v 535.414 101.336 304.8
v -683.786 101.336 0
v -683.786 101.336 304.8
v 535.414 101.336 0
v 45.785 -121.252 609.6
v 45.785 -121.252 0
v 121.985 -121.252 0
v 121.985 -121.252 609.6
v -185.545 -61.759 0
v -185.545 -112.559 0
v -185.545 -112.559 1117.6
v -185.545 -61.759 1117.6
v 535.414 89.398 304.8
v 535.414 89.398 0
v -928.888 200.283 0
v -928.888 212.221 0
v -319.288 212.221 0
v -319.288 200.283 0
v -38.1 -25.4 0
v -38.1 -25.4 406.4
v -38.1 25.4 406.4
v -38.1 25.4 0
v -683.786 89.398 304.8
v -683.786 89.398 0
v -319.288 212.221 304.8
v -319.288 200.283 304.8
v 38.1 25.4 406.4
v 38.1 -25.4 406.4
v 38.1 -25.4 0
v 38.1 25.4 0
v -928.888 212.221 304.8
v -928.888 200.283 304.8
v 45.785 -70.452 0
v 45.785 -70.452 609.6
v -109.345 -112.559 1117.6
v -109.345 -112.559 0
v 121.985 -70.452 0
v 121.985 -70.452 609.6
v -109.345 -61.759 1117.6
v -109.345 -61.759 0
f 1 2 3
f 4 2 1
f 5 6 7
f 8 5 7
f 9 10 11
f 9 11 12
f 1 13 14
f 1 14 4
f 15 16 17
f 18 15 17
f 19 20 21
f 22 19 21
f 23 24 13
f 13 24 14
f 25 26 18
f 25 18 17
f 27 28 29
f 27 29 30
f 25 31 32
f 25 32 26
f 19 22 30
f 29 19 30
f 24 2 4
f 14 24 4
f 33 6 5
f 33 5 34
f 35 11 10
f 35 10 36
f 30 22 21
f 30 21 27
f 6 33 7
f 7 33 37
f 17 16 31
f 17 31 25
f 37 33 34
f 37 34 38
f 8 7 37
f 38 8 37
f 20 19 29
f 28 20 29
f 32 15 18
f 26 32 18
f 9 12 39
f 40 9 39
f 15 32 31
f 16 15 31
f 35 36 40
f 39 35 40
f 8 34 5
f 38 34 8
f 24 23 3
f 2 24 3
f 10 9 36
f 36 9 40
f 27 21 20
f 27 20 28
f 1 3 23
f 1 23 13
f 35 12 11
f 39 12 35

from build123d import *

# Parameters (mm, degrees)
F0_W     = 76.2
F0_H     = 50.8
F1_DEPTH = 406.4
F2_DEPTH = 609.6
F3_DEPTH = 1117.6
F0_W_2   = 1219.2
F0_H_2   = 11.938
F4_DEPTH = 304.8
F0_W_3   = 609.6
F5_DEPTH = 304.8


with BuildPart() as f1:
    # F0 (on Top) → F1 (new body)
    with BuildSketch(Plane.XY):
        Rectangle(F0_W, F0_H)
    extrude(amount=F1_DEPTH)


with BuildPart() as f2:
    # F0 (on Top) → F2 (new body)
    with BuildSketch(Plane.XY):
        with Locations((83.884548, -95.851874)):
            Rectangle(F0_W, F0_H)
    extrude(amount=F2_DEPTH)


with BuildPart() as f3:
    # F0 (on Top) → F3 (new body)
    with BuildSketch(Plane.XY):
        with Locations((-147.445146, -87.159132)):
            Rectangle(F0_W, F0_H)
    extrude(amount=F3_DEPTH)


with BuildPart() as f4:
    # F0 (on Top) → F4 (new body)
    with BuildSketch(Plane.XY):
        with Locations((-74.185945, 95.36725)):
            Rectangle(F0_W_2, F0_H_2)
    extrude(amount=F4_DEPTH)


with BuildPart() as f5:
    # F0 (on Top) → F5 (new body)
    with BuildSketch(Plane.XY):
        with Locations((-624.088034, 206.25208)):
            Rectangle(F0_W_3, F0_H_2)
    extrude(amount=F5_DEPTH)


solid = Compound([f1.part, f2.part, f3.part, f4.part, f5.part])
